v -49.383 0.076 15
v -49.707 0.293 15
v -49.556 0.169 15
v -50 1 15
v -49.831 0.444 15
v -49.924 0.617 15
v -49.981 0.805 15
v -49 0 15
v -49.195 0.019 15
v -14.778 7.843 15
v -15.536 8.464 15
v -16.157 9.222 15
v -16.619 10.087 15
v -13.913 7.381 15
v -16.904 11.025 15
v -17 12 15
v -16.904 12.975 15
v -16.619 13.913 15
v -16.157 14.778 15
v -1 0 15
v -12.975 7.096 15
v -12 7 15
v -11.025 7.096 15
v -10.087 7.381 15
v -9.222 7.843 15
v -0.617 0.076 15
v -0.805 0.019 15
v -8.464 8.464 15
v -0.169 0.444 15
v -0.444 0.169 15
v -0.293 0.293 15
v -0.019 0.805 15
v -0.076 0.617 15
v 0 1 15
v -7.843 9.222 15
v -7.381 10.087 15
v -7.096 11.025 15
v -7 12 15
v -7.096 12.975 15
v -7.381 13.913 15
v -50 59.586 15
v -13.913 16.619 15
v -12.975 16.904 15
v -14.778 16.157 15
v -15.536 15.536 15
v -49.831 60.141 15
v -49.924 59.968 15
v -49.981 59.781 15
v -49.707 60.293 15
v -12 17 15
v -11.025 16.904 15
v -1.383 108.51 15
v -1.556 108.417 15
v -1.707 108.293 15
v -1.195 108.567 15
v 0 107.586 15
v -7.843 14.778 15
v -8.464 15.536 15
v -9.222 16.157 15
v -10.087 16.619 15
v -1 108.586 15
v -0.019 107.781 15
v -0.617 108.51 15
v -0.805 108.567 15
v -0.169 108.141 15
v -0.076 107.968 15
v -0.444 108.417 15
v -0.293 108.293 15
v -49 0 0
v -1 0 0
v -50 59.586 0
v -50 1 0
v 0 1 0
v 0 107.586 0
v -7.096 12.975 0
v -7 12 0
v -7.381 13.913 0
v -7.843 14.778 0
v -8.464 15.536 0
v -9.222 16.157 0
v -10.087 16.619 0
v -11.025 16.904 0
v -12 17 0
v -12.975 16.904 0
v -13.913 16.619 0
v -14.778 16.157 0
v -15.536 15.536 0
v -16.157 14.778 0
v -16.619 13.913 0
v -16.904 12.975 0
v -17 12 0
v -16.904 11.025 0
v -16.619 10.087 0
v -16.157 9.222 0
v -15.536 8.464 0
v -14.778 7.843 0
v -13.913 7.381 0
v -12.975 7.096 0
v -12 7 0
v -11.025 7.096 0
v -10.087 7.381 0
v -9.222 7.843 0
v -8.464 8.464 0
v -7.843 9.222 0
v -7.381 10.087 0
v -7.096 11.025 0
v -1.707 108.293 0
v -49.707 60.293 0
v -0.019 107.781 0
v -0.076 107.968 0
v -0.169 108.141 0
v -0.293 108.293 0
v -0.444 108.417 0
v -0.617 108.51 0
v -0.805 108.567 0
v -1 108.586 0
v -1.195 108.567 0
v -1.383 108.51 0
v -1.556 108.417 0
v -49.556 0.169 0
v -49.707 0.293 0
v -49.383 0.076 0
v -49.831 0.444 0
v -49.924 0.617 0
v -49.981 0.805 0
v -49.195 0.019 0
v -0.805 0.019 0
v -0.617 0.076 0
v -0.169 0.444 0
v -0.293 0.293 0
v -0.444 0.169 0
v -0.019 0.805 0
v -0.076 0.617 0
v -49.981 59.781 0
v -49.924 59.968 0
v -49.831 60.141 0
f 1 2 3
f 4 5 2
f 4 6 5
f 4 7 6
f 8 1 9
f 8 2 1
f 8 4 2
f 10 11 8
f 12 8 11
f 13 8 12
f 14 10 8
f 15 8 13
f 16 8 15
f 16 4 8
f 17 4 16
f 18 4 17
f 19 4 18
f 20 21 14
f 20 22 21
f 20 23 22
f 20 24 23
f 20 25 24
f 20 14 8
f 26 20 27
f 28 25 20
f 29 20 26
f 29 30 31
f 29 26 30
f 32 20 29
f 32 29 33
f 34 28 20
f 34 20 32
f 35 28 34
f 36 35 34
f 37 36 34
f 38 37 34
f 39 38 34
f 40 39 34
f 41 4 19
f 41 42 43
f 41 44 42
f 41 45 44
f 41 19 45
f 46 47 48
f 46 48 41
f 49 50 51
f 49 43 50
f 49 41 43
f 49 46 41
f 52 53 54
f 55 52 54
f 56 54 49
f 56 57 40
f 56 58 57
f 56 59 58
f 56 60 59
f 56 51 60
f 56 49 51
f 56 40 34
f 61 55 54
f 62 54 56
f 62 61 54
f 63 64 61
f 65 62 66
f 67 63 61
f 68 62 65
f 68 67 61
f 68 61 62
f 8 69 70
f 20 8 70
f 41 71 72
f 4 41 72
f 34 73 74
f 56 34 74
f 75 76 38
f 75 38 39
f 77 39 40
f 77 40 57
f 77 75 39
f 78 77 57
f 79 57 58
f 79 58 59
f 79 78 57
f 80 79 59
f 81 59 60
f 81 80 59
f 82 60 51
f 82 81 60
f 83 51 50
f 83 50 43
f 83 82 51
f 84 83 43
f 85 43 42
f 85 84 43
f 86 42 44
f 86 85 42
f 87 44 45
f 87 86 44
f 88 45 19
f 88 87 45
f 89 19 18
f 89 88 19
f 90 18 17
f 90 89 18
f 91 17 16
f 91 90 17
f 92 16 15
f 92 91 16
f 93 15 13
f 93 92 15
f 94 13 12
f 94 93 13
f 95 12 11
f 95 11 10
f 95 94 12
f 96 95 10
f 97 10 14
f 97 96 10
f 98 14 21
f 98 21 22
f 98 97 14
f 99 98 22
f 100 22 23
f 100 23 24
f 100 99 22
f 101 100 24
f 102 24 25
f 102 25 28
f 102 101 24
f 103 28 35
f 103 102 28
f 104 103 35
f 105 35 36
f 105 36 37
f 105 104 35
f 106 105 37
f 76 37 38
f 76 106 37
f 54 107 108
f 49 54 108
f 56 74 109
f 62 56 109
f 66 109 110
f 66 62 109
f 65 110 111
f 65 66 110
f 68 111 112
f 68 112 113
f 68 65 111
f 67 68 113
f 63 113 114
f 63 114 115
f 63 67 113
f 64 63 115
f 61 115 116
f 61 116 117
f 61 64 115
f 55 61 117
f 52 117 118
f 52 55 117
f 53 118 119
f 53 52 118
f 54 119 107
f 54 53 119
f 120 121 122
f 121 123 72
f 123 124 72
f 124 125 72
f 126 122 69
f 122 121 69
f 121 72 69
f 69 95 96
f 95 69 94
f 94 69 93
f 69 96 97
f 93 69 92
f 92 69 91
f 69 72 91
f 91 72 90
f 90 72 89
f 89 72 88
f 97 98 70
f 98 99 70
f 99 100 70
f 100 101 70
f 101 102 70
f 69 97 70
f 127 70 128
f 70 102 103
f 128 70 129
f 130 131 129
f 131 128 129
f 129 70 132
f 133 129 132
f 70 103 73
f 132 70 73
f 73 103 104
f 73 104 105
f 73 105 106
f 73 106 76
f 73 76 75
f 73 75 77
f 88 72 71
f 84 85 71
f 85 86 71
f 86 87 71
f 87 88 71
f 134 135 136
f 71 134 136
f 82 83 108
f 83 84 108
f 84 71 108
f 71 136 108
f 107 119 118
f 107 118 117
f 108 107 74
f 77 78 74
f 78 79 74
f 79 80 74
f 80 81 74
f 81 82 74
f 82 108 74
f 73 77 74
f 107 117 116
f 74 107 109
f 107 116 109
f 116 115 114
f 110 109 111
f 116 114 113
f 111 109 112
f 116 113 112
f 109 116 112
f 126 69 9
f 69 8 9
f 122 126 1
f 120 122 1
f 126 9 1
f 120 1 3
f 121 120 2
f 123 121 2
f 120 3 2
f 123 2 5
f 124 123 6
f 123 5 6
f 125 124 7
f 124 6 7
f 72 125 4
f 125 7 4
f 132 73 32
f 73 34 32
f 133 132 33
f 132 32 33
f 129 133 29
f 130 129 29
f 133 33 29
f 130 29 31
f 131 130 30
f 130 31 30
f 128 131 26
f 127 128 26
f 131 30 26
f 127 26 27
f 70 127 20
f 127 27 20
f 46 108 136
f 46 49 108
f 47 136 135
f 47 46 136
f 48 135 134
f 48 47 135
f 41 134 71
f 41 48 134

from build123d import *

# Parameters (mm, degrees)
SCHIZZO1_R                   = 5
ESTRUSIONE_ESTRUSIONE1_DEPTH = 15
RACCORDO1_R                  = 1


with BuildPart() as part:
    # Schizzo1 → Estrusione-Estrusione1 (new body)
    with BuildSketch(Plane.XY):
        Polygon((0, 0), (0, 110), (-50, 60), (-50, 0), align=None)
        with Locations((-12, 12)):
            Circle(SCHIZZO1_R, mode=Mode.SUBTRACT)
    extrude(amount=ESTRUSIONE_ESTRUSIONE1_DEPTH)

    # Raccordo1
    raccordo1_edges = [part.edges().sort_by_distance(p)[0] for p in [
        (-50, 0, 7.5),
        (-50, 60, 7.5),
        (0, 110, 7.5),
        (0, 0, 7.5),
    ]]
    fillet(raccordo1_edges, radius=RACCORDO1_R)


solid = part.part
